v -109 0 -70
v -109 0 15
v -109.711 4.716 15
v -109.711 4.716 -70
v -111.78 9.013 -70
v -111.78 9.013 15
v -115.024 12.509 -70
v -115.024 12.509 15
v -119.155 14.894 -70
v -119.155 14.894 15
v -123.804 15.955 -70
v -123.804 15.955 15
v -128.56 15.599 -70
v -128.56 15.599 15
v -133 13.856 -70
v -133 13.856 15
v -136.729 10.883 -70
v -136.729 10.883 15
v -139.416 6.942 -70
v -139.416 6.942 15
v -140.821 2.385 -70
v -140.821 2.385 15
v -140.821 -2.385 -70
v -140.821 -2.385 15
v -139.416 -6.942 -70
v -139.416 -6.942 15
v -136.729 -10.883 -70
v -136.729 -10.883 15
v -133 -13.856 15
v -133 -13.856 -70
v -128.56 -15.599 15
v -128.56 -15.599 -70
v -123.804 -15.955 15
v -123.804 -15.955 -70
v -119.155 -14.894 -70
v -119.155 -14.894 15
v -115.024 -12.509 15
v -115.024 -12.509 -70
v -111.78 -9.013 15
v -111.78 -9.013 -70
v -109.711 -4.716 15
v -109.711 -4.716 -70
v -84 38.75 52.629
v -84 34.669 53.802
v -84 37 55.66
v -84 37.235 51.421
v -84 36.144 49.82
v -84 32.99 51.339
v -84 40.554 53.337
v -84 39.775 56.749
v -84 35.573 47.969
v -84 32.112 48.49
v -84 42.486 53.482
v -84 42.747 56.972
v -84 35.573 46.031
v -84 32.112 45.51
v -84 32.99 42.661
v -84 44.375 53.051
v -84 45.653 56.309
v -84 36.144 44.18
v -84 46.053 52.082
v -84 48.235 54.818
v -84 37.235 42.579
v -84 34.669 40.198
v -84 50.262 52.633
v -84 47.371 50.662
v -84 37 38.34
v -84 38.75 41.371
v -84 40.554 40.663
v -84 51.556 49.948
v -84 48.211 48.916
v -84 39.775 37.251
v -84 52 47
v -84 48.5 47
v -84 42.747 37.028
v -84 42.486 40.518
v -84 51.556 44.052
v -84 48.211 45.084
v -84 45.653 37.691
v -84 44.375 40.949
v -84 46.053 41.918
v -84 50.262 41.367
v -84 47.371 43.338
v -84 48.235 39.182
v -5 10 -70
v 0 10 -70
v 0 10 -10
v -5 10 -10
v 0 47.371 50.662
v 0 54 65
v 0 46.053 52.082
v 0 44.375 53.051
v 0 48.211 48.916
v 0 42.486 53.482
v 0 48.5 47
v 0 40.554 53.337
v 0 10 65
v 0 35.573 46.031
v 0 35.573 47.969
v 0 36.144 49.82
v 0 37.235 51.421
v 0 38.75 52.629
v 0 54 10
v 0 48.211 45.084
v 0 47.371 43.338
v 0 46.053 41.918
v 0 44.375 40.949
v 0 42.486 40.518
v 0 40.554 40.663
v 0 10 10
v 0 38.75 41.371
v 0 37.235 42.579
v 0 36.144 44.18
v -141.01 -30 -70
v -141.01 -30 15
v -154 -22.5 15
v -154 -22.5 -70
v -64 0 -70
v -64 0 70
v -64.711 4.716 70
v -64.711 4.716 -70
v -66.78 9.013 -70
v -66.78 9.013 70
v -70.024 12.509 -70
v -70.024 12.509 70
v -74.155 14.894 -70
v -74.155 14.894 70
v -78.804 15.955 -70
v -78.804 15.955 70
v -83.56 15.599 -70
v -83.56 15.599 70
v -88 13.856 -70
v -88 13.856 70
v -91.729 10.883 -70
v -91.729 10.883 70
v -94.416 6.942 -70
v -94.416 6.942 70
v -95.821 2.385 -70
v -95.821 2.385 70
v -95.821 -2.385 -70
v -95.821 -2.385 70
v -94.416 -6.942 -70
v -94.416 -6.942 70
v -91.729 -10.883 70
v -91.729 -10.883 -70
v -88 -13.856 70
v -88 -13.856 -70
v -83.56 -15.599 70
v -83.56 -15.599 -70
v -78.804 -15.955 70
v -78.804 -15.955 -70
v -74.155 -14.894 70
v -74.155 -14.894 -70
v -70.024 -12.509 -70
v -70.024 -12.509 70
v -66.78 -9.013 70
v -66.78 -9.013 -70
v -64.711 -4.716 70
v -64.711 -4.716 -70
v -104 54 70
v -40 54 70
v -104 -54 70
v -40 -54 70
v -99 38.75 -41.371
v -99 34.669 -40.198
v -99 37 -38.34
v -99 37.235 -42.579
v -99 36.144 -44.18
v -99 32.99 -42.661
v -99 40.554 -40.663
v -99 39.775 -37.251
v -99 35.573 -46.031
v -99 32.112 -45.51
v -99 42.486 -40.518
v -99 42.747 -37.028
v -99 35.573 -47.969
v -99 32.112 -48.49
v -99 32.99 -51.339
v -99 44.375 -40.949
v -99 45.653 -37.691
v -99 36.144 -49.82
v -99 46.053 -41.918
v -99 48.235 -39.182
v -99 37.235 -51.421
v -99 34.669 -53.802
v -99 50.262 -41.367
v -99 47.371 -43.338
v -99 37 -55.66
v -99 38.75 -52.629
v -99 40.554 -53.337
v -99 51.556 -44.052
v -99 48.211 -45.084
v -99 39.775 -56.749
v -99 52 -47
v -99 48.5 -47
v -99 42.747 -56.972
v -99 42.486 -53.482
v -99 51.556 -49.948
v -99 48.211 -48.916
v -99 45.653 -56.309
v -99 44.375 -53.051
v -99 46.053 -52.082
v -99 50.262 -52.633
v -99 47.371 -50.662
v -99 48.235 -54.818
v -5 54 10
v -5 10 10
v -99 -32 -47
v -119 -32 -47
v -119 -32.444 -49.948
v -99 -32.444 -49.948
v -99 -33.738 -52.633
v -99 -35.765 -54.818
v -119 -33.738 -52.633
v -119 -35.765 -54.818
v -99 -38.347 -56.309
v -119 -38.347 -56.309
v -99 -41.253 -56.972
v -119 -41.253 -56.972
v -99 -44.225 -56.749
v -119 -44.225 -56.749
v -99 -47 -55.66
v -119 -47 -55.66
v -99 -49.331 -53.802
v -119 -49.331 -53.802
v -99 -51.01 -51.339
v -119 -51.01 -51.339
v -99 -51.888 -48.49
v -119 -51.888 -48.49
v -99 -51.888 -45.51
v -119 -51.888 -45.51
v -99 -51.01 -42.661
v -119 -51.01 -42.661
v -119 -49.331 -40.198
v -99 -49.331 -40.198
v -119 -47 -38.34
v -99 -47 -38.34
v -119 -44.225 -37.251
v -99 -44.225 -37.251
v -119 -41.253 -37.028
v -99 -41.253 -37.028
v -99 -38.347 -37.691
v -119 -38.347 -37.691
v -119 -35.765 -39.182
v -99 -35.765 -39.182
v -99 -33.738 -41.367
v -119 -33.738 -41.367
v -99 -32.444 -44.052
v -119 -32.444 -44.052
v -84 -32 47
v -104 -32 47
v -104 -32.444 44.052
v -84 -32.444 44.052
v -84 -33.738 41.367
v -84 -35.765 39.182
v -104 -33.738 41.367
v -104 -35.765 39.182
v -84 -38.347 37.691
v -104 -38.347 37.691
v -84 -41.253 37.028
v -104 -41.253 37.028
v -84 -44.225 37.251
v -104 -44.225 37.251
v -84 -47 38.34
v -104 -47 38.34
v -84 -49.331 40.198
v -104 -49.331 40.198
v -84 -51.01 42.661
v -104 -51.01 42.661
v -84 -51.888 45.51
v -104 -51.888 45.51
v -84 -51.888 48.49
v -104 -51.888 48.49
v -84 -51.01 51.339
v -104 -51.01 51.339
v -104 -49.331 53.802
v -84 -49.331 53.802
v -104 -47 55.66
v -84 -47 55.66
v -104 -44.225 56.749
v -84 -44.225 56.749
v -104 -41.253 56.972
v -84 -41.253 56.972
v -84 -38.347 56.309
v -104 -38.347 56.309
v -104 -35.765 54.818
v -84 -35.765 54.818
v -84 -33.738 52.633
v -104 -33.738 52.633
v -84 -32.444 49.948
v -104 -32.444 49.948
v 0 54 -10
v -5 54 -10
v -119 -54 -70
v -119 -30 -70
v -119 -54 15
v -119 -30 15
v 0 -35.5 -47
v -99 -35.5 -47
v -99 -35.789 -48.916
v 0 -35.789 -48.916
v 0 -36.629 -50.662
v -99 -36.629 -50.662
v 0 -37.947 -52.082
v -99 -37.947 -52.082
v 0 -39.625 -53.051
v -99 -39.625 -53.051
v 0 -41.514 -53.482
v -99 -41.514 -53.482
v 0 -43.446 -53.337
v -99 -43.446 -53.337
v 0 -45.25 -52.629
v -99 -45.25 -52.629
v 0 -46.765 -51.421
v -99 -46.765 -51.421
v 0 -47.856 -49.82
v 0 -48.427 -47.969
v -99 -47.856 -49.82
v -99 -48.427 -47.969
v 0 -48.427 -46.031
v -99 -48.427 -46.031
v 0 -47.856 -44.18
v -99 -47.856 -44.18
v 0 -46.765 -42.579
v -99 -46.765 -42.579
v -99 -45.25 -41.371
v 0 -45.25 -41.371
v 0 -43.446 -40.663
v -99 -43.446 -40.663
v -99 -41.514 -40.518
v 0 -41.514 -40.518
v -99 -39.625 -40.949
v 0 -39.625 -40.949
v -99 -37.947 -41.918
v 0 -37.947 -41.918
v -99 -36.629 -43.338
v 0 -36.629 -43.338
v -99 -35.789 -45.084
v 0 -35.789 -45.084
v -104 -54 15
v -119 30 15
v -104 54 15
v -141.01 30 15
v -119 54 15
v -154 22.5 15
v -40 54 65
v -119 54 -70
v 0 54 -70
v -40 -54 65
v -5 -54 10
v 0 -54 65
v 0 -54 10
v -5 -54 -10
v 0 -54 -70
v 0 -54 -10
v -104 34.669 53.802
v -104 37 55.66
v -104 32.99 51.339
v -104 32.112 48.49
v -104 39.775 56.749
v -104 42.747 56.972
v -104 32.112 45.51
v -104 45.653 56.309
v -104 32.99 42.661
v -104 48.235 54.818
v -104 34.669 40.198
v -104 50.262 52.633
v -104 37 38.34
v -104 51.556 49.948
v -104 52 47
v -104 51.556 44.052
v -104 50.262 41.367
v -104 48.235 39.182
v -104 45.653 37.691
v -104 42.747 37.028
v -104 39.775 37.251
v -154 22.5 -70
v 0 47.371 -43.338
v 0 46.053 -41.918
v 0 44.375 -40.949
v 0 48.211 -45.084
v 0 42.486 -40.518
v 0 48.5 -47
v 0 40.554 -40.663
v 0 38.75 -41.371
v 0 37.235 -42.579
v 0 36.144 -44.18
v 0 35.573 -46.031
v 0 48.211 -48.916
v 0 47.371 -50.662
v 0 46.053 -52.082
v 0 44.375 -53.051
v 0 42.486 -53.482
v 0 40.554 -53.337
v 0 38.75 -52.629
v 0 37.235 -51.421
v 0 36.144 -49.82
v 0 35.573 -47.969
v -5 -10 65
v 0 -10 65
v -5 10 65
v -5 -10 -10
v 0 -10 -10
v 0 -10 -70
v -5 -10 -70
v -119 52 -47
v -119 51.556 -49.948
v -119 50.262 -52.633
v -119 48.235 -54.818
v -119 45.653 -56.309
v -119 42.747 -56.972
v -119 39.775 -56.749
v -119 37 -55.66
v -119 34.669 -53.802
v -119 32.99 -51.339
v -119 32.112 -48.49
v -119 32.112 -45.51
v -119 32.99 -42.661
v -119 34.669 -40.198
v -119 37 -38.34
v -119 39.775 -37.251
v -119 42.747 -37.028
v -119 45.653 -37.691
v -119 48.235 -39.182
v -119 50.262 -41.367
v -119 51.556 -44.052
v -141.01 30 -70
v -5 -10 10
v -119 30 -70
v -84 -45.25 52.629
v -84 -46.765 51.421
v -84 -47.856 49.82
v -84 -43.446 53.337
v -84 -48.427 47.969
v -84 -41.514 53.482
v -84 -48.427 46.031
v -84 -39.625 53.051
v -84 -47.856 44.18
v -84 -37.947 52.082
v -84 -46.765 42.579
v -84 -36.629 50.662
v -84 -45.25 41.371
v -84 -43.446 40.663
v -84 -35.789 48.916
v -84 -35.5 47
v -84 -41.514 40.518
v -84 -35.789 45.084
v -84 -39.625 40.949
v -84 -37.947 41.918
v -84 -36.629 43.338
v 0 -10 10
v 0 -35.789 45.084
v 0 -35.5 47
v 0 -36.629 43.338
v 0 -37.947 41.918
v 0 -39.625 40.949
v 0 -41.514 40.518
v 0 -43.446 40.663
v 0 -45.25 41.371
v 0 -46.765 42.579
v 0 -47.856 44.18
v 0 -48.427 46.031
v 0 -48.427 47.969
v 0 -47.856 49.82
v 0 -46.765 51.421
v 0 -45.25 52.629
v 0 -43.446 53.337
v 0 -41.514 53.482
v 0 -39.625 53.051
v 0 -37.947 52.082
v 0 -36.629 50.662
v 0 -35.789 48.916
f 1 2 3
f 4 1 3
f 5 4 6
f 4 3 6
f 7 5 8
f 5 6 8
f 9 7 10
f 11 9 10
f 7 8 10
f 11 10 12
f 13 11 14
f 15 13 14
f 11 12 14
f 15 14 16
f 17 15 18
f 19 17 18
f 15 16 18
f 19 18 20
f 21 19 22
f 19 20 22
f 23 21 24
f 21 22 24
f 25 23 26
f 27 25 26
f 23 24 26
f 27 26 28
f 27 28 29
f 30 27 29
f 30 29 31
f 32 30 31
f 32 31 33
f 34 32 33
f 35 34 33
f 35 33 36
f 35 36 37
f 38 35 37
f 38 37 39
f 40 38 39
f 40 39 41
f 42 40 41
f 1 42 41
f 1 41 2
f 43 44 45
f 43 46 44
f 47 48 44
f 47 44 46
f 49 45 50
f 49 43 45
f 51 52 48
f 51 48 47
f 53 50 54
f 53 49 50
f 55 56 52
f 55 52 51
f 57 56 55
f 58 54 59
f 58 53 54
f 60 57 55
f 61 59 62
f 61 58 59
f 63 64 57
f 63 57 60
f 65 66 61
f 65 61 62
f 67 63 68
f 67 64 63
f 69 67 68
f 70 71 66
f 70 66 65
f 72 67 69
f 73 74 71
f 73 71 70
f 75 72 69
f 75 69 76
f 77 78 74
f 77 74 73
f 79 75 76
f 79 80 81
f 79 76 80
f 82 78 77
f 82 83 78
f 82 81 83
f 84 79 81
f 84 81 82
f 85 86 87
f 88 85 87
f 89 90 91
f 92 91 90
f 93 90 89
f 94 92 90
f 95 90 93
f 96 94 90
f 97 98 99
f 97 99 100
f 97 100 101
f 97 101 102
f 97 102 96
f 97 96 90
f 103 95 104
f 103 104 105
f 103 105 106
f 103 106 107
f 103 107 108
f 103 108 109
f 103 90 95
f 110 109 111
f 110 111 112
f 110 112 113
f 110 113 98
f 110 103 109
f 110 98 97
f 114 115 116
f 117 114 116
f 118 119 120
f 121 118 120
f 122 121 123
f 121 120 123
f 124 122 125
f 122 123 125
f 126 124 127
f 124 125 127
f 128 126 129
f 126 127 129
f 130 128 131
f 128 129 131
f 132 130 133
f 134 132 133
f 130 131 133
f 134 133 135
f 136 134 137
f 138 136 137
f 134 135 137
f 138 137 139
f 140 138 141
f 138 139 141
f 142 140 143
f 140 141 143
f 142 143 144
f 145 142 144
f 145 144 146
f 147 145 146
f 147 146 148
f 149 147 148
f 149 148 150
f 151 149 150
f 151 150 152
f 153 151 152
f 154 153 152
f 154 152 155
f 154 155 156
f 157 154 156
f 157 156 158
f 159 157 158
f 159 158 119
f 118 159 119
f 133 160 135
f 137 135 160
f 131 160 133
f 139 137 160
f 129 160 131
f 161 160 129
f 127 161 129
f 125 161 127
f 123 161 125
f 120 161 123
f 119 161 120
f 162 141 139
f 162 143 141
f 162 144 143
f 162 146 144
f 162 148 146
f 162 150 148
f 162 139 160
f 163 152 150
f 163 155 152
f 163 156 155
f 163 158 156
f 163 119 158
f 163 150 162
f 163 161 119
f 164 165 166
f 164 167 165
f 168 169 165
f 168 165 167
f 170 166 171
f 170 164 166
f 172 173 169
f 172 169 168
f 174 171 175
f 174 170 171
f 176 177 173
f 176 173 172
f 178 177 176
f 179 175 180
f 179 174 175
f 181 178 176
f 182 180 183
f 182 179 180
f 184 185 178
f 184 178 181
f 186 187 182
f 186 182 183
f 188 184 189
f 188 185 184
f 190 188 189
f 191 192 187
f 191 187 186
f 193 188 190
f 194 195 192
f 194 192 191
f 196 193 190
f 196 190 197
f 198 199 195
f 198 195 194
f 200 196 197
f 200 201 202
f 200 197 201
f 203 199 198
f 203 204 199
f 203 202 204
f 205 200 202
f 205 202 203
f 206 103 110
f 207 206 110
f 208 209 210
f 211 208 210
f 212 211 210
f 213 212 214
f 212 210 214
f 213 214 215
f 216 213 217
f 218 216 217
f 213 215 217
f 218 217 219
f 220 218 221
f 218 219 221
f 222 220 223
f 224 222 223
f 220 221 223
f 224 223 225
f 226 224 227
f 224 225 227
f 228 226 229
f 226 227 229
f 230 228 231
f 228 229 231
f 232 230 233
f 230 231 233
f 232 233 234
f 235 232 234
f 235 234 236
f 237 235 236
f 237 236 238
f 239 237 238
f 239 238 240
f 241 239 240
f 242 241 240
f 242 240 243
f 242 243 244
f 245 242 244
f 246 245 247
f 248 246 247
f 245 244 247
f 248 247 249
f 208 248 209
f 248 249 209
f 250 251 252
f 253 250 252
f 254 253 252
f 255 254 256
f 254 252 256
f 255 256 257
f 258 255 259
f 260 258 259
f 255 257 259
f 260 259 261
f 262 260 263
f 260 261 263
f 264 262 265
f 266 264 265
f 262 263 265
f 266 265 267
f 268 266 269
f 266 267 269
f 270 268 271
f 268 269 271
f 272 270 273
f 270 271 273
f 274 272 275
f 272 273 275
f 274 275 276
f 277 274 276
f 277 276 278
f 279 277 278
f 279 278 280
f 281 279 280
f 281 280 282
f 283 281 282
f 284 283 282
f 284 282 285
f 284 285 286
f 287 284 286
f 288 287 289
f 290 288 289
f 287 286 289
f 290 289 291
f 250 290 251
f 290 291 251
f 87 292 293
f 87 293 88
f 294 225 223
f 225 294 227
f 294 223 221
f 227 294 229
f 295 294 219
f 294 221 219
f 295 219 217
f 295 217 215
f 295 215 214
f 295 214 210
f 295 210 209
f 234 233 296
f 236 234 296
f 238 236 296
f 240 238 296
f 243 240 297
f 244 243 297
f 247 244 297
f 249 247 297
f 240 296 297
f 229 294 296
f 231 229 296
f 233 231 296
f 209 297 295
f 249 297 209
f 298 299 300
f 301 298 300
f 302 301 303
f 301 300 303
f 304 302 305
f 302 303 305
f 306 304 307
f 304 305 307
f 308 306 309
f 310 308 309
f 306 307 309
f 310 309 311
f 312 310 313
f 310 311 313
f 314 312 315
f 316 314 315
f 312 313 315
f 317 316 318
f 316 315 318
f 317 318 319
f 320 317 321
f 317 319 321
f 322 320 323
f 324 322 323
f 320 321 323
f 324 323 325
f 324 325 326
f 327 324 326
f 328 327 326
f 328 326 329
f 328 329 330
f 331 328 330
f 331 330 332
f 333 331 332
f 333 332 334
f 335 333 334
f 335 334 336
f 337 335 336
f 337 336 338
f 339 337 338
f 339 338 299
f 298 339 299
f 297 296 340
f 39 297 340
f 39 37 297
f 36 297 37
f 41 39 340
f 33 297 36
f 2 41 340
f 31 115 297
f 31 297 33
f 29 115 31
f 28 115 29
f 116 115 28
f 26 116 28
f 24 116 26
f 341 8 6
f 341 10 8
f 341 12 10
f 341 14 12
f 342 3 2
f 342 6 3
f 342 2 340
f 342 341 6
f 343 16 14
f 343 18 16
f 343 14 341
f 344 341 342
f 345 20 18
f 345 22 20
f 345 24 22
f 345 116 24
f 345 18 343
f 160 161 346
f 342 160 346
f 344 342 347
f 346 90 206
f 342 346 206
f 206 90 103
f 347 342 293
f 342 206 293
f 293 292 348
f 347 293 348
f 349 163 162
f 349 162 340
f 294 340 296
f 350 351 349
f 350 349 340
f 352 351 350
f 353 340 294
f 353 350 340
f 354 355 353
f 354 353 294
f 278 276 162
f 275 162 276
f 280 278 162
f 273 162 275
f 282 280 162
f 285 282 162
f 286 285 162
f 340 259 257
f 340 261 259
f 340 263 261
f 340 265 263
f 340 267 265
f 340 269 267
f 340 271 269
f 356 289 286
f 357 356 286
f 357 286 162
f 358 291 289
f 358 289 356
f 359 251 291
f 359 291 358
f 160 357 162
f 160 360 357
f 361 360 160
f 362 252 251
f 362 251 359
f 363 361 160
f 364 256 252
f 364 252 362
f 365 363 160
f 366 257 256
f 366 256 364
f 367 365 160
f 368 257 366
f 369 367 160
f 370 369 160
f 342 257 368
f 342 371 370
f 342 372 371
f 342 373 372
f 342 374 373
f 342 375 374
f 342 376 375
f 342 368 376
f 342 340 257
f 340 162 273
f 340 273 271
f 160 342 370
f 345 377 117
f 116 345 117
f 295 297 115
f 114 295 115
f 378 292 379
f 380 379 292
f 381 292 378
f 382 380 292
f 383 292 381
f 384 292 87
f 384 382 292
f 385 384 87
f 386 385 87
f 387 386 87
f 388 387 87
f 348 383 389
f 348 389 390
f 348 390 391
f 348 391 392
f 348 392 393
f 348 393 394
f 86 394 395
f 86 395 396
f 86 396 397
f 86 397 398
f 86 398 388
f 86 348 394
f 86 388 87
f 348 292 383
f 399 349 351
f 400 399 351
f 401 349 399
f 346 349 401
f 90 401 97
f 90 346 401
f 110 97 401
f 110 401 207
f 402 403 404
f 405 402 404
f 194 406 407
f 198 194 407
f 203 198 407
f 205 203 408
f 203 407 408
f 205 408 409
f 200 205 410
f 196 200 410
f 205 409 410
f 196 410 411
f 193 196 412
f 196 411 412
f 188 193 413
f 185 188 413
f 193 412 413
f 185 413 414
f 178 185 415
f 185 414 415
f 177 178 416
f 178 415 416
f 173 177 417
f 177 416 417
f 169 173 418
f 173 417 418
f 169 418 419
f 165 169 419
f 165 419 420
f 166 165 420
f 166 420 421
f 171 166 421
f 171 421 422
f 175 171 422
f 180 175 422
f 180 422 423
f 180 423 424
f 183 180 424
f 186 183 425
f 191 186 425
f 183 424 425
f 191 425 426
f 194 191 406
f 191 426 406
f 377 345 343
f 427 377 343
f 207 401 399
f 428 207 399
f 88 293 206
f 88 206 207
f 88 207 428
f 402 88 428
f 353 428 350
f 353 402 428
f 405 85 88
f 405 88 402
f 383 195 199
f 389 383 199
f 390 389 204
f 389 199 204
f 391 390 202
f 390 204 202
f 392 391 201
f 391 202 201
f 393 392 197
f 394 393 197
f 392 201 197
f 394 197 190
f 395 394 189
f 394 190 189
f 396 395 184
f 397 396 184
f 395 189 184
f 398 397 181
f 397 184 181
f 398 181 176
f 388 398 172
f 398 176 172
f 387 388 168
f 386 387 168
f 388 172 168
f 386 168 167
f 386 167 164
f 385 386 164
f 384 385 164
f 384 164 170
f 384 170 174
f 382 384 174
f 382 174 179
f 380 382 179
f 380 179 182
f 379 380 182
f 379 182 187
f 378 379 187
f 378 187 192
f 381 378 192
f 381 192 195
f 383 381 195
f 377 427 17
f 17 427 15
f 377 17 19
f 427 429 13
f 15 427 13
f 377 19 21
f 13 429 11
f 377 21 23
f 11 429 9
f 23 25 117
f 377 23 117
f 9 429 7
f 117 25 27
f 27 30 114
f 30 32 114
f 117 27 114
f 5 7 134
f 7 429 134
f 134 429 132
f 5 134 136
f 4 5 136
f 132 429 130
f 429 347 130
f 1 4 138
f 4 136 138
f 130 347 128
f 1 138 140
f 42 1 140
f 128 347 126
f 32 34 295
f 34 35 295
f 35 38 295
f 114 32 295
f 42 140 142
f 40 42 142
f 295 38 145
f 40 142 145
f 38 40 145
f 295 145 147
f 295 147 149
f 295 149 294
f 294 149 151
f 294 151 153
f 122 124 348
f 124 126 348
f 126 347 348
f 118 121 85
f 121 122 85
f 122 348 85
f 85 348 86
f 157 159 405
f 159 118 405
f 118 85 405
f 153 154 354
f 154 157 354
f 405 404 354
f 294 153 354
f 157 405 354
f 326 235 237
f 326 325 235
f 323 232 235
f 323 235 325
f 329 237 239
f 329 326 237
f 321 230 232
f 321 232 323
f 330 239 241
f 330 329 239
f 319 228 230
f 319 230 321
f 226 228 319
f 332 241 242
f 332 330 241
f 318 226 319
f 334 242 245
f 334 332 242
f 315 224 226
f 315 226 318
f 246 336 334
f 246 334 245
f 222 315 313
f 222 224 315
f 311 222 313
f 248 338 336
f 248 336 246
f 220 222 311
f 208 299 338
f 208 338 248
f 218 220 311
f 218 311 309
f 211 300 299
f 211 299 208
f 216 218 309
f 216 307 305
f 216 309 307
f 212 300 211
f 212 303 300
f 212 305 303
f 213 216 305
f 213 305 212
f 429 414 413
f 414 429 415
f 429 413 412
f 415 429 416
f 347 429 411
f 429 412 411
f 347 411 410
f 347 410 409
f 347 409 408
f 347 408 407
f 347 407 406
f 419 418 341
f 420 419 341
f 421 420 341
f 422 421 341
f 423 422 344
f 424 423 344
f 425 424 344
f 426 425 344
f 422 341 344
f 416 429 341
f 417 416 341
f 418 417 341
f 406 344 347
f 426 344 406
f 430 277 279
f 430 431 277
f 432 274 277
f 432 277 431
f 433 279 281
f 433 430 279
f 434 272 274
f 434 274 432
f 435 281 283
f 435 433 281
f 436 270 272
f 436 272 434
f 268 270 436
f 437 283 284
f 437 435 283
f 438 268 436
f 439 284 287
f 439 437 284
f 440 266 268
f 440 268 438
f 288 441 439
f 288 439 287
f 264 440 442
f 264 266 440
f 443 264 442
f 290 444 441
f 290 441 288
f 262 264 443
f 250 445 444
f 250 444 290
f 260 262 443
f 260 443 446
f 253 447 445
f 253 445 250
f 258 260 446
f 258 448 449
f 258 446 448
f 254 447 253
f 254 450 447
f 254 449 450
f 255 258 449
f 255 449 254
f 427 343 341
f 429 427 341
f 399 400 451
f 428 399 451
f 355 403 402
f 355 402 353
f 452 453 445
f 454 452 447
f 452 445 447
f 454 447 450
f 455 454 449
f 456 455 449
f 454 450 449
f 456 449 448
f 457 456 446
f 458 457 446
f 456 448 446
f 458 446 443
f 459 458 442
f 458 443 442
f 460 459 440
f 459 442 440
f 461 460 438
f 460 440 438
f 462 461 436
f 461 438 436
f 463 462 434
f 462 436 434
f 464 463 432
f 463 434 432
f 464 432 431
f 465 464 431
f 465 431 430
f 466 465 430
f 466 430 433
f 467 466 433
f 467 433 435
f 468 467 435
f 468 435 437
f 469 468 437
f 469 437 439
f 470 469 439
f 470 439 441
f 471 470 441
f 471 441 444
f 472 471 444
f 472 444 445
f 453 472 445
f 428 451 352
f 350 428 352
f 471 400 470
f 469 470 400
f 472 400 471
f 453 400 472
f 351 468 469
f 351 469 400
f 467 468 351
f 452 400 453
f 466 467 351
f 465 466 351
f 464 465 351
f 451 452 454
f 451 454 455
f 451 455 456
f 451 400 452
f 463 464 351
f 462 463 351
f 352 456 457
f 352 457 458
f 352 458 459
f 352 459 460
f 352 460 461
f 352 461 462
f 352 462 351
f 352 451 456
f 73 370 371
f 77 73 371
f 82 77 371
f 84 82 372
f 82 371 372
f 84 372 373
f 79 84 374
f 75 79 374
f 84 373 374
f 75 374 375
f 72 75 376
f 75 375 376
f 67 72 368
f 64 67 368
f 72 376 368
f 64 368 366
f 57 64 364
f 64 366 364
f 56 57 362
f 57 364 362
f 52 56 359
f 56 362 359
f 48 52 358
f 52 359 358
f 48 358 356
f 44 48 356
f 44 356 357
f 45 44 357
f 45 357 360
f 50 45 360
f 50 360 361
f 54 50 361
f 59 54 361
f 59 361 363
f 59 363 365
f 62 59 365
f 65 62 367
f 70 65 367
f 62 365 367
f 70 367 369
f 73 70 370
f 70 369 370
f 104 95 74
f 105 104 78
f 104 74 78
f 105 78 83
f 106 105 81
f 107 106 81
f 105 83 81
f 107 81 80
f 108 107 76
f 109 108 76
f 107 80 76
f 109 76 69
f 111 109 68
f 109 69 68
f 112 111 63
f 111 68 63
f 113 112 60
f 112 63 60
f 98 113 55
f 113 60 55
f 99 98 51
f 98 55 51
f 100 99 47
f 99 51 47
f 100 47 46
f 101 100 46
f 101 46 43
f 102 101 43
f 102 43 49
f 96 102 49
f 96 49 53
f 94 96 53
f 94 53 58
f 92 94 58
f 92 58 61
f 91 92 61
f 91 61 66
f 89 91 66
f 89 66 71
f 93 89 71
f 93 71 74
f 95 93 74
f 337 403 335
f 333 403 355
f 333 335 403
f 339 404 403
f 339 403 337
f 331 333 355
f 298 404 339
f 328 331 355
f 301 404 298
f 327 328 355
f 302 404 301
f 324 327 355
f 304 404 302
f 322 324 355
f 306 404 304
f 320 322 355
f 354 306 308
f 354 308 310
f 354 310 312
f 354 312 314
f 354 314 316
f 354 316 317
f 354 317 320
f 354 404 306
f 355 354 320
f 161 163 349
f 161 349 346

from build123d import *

# Parameters (mm, degrees)
F0_W      = 108
F0_H      = 140
F1_DEPTH  = 154
F2_R      = 6.5
F3_DEPTH  = 154.001
F4_R      = 16
F5_DEPTH  = 140.001
F6_W      = 108
F6_H      = 55
F7_DEPTH  = 50
F9_DEPTH  = 85.001
F10_W     = 40
F10_H     = 108
F11_DEPTH = 5
F12_R     = 10
F13_DEPTH = 20
F14_R     = 10
F15_DEPTH = 20
F16_W     = 20
F16_H     = 60
F16_W_2   = 44
F16_H_2   = 20
F17_DEPTH = 5
F19_ANGLE = 180


with BuildPart() as f1:
    # F0 (on Right) → F1 (new body)
    with BuildSketch(Plane.YZ):
        Rectangle(F0_W, F0_H)
    extrude(amount=-F1_DEPTH)

    # F2 (on face) → F3 (cut, through all)
    with BuildSketch(Plane(origin=(-154, 0, 0), x_dir=(0, -1, 0), z_dir=(-1, 0, 0))):
        with Locations((-42, 47)):
            Circle(F2_R)
        with Locations((42, 47)):
            Circle(F2_R)
        with Locations((-42, -47)):
            Circle(F2_R)
        with Locations((42, -47)):
            Circle(F2_R)
    extrude(amount=-F3_DEPTH, mode=Mode.SUBTRACT)

    # F4 (on face) → F5 (cut, through all)
    with BuildSketch(Plane(origin=(0, 0, -70), x_dir=(1, 0, 0), z_dir=(0, 0, -1))):
        with Locations((-125, 0)):
            Circle(F4_R)
        with Locations((-80, 0)):
            Circle(F4_R)
    extrude(amount=-F5_DEPTH, mode=Mode.SUBTRACT)

    # F6 (on face) → F7 (cut)
    with BuildSketch(Plane(origin=(-154, 0, 0), x_dir=(0, -1, 0), z_dir=(-1, 0, 0))):
        with Locations((0, -42.5)):
            Rectangle(F6_W, F6_H)
    extrude(amount=-F7_DEPTH, mode=Mode.SUBTRACT)

    # F8 (on face) → F9 (cut, through all)
    with BuildSketch(Plane(origin=(0, 0, -15), x_dir=(1, 0, 0), z_dir=(0, 0, -1))):
        Polygon((-154, -54), (-119, -54), (-119, -30), (-141.0096189432, -30), (-154, -22.5), align=None)
        Polygon((-119, 30), (-119, 54), (-154, 54), (-154, 22.5), (-141.0096189432, 30), align=None)
    extrude(amount=-F9_DEPTH, mode=Mode.SUBTRACT)

    # F10 (on face) → F11 (cut)
    with BuildSketch(Plane(origin=(0, 0, -70), x_dir=(1, 0, 0), z_dir=(0, 0, -1))):
        with Locations((-20, 0)):
            Rectangle(F10_W, F10_H)
    extrude(amount=-F11_DEPTH, mode=Mode.SUBTRACT)

    # F12 (on face) → F13 (cut)
    with BuildSketch(Plane(origin=(-104, 0, 0), x_dir=(0, -1, 0), z_dir=(-1, 0, 0))):
        with Locations((-42, -47)):
            Circle(F12_R)
        with Locations((42, -47)):
            Circle(F12_R)
    extrude(amount=-F13_DEPTH, mode=Mode.SUBTRACT)

    # F14 (on face) → F15 (cut)
    with BuildSketch(Plane(origin=(-119, 0, 0), x_dir=(0, -1, 0), z_dir=(-1, 0, 0))):
        with Locations((-42, 47)):
            Circle(F14_R)
        with Locations((42, 47)):
            Circle(F14_R)
    extrude(amount=-F15_DEPTH, mode=Mode.SUBTRACT)

    # F16 (on face) → F17 (cut)
    with BuildSketch(Plane.YZ):
        with Locations((0, 40)):
            Rectangle(F16_W, F16_H)
        with Locations((32, 0)):
            Rectangle(F16_W_2, F16_H_2)
        Rectangle(F16_W, F16_H_2)
        with Locations((-32, 0)):
            Rectangle(F16_W_2, F16_H_2)
        with Locations((0, -40)):
            Rectangle(F16_W, F16_H)
    extrude(amount=-F17_DEPTH, mode=Mode.SUBTRACT)


with BuildPart() as f1_1:
    # F19: moved
    add(f1.part.rotate(Axis((58.3656840026, 0, 0), (1, 0, 0)), F19_ANGLE))


solid = f1_1.part
